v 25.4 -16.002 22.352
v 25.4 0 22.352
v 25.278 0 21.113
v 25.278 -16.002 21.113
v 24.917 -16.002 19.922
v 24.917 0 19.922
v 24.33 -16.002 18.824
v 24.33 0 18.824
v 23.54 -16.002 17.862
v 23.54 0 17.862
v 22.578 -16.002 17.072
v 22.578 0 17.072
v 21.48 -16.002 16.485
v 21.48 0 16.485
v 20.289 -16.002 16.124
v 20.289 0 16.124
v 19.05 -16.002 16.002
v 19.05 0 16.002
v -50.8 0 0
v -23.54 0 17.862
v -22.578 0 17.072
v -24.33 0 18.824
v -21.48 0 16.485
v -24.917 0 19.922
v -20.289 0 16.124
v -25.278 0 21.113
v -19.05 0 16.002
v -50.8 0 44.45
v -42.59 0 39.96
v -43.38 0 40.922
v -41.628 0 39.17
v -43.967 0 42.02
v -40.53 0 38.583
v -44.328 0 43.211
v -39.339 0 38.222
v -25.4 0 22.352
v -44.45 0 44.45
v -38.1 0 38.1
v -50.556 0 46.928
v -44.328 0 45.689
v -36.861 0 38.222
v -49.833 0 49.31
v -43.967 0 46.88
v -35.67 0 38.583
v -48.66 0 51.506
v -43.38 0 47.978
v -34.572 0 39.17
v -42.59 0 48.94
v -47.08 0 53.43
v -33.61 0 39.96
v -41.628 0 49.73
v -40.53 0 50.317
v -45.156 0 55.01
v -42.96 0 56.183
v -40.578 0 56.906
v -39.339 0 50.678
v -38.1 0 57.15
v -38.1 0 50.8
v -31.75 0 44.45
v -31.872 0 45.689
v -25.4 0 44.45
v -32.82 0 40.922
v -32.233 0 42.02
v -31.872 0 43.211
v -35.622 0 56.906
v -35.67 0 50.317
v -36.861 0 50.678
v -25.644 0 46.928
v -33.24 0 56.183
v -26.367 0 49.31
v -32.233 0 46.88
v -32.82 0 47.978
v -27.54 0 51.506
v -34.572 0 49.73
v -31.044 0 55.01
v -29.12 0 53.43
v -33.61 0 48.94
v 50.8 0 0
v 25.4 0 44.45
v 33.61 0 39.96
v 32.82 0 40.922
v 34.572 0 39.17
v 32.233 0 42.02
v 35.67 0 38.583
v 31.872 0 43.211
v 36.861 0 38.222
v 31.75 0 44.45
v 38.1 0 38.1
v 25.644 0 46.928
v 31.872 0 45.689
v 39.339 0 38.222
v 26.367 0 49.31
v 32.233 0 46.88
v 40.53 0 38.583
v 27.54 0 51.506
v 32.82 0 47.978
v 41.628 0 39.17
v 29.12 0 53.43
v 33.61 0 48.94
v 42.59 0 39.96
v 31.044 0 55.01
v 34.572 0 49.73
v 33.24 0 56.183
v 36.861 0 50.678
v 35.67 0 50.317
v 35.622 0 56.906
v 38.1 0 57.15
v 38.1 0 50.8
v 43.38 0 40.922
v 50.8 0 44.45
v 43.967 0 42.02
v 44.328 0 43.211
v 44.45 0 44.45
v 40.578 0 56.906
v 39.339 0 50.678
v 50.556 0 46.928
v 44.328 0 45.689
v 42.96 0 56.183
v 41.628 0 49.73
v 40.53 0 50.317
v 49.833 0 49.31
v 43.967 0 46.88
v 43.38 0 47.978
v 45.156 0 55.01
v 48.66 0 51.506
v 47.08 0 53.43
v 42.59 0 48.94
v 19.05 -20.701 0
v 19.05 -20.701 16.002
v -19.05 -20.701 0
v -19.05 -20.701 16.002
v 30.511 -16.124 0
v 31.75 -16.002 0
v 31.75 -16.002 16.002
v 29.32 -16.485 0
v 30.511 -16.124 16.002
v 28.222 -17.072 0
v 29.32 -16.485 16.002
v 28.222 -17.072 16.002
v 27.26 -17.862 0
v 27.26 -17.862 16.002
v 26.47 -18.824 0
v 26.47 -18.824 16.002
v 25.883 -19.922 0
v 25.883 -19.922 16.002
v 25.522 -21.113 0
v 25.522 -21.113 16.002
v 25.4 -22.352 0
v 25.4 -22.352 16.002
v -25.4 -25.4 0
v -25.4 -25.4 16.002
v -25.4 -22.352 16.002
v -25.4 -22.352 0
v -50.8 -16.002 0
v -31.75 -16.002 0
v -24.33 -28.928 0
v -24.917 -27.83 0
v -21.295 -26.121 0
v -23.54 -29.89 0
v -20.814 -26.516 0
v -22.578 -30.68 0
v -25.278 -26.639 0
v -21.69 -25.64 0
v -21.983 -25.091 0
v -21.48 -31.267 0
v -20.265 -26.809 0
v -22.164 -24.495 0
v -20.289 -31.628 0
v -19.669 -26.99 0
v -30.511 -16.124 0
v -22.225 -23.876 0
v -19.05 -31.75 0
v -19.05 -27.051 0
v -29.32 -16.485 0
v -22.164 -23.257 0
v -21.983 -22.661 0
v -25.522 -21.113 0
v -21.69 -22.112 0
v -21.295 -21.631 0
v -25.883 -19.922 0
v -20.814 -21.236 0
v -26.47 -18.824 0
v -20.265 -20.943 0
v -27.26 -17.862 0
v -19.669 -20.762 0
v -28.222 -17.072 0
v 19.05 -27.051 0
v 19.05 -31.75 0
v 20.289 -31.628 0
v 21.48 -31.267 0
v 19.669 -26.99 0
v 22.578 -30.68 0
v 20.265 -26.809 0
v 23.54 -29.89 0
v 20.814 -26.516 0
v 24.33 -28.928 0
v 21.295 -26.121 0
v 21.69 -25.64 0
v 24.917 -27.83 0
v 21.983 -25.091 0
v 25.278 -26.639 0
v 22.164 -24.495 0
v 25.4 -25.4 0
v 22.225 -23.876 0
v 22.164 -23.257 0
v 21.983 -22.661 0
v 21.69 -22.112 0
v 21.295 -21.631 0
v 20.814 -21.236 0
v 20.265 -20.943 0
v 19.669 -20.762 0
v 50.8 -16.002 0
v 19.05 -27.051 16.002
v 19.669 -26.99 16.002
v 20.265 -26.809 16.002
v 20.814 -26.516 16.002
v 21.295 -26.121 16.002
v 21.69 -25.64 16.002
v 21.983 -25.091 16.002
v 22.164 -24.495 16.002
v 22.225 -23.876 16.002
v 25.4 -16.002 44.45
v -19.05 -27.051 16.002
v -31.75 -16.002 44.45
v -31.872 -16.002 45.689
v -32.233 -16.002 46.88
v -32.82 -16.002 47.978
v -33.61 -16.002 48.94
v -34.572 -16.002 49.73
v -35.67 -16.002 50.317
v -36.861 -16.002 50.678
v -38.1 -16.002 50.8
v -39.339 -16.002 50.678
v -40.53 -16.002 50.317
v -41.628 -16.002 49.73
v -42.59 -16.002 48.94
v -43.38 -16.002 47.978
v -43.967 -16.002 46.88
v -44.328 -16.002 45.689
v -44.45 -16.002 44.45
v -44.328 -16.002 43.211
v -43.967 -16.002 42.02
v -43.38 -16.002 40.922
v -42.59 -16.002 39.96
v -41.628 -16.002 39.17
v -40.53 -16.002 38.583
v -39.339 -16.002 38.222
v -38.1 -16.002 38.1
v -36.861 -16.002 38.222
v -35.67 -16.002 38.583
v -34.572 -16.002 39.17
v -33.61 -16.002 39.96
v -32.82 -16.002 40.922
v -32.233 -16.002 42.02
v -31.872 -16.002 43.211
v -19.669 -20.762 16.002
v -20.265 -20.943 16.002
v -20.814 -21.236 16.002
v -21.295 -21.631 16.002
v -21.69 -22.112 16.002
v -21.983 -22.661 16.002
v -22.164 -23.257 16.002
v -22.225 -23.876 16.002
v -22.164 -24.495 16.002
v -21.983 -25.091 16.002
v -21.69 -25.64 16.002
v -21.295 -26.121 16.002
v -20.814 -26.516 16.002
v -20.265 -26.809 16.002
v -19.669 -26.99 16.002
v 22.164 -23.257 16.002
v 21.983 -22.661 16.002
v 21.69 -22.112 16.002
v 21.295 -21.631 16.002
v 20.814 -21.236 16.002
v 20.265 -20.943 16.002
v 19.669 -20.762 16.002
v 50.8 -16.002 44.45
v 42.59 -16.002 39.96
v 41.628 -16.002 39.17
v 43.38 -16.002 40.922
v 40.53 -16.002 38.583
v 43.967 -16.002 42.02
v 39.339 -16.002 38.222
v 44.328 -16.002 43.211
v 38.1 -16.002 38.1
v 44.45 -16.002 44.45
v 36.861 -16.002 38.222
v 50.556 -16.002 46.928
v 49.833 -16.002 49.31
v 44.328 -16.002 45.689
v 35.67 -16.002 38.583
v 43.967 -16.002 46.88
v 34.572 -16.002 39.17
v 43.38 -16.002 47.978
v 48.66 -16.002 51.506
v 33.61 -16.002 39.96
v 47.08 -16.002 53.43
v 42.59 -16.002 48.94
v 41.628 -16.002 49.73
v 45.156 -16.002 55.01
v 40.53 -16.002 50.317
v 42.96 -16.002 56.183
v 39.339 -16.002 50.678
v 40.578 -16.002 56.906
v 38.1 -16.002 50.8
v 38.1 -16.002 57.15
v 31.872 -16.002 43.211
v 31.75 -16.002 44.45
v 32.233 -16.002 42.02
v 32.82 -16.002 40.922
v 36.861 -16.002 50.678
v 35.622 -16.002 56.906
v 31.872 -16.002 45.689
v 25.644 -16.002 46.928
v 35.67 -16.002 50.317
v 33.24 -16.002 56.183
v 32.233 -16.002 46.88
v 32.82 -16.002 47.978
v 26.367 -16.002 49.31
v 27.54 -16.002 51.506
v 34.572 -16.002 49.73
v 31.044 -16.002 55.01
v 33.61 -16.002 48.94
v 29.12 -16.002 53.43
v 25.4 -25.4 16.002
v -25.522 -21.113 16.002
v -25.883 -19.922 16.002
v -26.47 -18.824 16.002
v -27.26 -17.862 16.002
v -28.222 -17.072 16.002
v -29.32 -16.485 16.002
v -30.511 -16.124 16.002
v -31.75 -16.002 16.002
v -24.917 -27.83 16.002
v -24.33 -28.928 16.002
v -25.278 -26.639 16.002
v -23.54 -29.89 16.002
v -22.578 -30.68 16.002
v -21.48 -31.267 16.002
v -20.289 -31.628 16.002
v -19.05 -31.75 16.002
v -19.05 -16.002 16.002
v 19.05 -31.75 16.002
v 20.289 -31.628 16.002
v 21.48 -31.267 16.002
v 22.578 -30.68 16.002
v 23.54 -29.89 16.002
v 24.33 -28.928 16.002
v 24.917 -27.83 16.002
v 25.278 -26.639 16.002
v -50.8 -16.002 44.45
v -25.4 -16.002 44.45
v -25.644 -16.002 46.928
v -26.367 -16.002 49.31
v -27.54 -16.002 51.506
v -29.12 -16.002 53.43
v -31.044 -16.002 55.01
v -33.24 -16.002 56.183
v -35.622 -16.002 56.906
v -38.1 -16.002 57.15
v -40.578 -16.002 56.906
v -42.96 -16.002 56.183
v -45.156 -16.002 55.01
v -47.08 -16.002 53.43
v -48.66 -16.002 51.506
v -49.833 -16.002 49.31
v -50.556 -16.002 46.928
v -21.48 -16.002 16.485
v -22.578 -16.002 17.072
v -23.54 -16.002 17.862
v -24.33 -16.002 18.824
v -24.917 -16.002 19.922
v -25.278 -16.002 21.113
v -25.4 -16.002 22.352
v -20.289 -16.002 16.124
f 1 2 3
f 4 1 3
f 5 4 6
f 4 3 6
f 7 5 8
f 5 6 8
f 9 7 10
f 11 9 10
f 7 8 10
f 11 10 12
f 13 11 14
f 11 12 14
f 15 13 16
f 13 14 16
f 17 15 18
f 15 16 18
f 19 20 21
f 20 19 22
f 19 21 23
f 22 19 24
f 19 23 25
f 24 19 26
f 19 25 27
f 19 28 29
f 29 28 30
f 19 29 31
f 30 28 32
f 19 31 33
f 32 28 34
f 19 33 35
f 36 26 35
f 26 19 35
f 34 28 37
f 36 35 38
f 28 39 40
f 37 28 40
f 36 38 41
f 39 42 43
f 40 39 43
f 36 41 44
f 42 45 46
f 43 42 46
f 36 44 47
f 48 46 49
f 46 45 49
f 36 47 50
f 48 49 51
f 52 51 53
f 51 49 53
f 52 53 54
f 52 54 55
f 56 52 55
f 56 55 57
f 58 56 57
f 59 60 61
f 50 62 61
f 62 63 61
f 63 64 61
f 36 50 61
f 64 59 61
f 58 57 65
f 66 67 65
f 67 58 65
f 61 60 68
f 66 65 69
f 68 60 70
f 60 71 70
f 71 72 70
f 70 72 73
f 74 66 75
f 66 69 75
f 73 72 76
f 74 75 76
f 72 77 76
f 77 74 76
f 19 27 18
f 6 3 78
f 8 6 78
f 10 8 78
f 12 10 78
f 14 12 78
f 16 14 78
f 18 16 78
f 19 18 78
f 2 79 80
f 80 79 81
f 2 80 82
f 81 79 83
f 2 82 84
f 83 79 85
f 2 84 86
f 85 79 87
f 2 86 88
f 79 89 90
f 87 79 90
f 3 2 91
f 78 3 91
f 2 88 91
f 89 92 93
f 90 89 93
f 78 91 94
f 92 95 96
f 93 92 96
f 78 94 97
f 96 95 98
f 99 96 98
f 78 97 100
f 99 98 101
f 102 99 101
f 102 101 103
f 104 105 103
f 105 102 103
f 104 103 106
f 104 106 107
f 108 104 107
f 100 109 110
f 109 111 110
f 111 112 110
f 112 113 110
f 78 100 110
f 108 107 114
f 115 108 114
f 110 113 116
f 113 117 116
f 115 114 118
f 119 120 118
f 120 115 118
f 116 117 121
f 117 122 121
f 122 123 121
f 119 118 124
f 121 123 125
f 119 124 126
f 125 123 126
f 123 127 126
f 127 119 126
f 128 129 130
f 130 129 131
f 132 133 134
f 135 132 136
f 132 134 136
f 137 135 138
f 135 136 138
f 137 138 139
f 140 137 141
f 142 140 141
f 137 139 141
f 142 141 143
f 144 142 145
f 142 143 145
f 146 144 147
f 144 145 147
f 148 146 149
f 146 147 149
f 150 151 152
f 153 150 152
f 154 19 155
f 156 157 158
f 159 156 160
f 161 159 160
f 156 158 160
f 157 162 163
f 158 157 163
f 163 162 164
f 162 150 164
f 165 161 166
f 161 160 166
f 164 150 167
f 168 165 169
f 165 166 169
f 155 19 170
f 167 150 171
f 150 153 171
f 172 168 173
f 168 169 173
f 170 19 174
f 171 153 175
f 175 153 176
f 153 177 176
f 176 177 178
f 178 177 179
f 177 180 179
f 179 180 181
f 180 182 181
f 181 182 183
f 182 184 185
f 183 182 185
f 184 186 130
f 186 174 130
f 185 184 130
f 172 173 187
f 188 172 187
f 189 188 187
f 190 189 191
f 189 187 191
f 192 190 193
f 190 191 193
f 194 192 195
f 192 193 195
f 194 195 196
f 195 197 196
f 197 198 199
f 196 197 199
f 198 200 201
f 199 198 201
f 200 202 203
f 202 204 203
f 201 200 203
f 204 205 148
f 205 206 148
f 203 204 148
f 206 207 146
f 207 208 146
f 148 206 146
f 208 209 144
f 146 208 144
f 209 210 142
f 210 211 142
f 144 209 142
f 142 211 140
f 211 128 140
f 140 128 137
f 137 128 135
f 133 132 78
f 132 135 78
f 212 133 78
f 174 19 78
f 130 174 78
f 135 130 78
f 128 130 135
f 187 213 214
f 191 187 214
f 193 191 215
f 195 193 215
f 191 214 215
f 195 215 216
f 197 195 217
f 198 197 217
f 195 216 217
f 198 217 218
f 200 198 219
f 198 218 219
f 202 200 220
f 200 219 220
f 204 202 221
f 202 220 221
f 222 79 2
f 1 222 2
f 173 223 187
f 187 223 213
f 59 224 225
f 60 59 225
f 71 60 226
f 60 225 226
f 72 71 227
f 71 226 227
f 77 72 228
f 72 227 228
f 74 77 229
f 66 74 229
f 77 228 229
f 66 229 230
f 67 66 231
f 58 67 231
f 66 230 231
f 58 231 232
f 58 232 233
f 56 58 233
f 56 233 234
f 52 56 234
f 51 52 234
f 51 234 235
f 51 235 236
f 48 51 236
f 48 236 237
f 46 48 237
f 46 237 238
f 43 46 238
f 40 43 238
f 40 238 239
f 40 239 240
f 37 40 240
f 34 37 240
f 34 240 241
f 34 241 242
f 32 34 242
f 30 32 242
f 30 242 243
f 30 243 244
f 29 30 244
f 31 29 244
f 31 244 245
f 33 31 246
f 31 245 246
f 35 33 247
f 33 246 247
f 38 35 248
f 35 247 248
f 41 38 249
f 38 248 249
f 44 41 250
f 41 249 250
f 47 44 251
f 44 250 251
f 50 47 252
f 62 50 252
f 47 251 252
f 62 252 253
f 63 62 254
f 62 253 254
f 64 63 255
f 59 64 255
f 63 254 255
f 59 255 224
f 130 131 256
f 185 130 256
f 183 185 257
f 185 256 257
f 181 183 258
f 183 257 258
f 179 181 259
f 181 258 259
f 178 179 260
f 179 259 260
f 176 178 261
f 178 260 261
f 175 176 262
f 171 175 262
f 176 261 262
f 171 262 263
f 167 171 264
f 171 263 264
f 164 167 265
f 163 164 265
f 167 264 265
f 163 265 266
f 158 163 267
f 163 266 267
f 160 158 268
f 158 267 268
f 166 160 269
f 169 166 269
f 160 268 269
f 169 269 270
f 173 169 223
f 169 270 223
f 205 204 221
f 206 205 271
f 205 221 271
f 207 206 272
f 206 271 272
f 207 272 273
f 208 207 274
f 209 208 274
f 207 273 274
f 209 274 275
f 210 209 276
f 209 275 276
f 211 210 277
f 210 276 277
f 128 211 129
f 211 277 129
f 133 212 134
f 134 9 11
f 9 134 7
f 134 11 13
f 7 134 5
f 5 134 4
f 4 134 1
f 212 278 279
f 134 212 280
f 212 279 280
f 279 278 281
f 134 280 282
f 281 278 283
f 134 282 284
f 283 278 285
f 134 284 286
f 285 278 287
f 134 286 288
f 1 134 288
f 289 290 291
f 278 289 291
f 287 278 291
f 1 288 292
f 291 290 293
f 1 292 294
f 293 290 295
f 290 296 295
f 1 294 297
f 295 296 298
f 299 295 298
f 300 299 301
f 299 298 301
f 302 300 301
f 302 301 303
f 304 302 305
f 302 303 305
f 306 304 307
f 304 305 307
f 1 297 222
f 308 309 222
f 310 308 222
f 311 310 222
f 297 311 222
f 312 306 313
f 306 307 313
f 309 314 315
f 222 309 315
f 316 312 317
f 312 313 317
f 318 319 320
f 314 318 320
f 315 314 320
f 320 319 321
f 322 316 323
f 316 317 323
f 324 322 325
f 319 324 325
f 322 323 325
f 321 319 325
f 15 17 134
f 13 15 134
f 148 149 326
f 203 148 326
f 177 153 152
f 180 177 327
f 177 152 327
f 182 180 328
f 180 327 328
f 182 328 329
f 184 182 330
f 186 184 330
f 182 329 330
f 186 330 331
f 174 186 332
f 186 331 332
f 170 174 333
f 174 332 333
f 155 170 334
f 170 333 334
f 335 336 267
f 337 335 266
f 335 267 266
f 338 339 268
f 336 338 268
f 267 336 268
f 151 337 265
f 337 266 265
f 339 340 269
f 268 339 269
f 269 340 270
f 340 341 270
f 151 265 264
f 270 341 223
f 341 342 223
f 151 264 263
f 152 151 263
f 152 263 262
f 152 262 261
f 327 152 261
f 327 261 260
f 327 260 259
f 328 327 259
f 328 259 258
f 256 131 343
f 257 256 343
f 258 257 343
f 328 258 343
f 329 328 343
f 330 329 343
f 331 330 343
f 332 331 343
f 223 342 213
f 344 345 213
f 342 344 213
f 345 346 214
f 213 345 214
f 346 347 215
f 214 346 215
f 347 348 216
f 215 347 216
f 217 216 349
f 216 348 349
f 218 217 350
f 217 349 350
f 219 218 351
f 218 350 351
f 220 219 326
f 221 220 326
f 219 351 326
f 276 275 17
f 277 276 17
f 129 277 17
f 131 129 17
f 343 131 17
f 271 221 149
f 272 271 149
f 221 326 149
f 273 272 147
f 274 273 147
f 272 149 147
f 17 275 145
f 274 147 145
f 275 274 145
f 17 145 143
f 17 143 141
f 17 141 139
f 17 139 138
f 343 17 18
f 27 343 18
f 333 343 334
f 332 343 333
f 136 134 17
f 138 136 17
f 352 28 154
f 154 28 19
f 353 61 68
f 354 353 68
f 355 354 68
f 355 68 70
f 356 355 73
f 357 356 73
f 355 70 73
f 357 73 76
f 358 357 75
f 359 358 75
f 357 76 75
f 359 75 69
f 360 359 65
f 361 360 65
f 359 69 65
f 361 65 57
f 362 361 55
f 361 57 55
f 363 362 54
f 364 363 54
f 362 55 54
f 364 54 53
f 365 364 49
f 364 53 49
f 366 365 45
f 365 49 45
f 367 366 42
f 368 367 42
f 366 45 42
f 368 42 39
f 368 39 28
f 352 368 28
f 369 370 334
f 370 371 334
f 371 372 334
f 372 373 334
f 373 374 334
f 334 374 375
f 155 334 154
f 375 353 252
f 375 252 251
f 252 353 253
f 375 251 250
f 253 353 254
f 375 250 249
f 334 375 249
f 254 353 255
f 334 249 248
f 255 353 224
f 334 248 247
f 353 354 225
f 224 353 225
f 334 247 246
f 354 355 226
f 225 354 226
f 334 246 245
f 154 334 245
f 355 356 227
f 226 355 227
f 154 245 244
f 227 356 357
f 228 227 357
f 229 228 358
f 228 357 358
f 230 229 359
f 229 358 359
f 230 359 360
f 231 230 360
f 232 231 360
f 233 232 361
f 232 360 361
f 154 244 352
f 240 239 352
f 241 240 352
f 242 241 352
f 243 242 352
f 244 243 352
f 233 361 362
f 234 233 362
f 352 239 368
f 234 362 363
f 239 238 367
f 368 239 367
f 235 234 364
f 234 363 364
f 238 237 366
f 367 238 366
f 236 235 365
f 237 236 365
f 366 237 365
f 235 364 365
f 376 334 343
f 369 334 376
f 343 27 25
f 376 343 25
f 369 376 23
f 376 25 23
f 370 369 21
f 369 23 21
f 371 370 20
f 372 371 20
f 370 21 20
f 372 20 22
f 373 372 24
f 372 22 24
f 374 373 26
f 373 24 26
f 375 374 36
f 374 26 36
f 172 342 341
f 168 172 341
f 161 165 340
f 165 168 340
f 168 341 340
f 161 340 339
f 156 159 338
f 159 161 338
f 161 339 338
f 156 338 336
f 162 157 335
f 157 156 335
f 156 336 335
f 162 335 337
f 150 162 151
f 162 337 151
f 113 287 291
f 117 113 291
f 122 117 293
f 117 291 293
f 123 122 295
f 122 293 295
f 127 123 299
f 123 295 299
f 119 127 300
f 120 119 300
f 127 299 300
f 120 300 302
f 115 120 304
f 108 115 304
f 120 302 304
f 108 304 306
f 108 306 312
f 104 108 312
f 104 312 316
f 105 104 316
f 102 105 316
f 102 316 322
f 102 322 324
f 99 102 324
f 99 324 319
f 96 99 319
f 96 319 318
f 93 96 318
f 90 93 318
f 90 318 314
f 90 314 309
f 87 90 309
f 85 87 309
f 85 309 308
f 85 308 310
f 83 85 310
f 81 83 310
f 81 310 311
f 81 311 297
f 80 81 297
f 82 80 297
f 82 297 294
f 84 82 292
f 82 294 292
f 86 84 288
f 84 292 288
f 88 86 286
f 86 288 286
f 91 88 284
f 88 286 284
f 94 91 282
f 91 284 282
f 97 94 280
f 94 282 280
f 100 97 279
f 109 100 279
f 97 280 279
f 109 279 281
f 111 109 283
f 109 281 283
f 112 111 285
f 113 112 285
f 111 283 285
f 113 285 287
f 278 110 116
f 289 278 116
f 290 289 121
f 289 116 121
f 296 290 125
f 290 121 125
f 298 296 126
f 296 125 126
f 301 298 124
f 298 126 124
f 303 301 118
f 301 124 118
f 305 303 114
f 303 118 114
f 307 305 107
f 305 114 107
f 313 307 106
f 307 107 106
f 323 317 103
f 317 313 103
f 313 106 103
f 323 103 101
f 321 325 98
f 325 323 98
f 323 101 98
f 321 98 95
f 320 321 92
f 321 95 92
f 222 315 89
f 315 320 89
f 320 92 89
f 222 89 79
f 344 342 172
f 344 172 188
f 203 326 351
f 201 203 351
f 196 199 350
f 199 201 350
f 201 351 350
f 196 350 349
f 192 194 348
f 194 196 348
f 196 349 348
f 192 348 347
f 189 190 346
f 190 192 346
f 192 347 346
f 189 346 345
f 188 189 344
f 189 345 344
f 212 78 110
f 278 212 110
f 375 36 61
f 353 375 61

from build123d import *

# Parameters (mm, degrees)
F1_DEPTH = 31.75
F2_W     = 15.748
F2_H     = 28.448
F2_H_2   = 12.7
F3_DEPTH = 101.601
F5_DEPTH = 16.003
F6_R     = 6.35
F7_DEPTH = 16.003
F8_R     = 6.35
F9_DEPTH = 16.003


with BuildPart() as f1:
    # F0 (on Front) → F1 (new body)
    with BuildSketch(Plane.XZ):
        with BuildLine():
            Line((-50.8, 0), (0, 0))
            Line((0, 0), (0, 16.002))
            Line((0, 16.002), (-19.05, 16.002))
            ThreePointArc((-19.05, 16.002), (-23.540128, 17.861872), (-25.4, 22.352))
            Line((-25.4, 22.352), (-25.4, 44.45))
            ThreePointArc((-25.4, 44.45), (-38.1, 57.15), (-50.8, 44.45))
            Line((-50.8, 44.45), (-50.8, 0))
        make_face()
        with BuildLine():
            Line((0, 16.002), (0, 0))
            Line((0, 0), (50.8, 0))
            Line((50.8, 0), (50.8, 44.45))
            ThreePointArc((50.8, 44.45), (38.1, 57.15), (25.4, 44.45))
            Line((25.4, 44.45), (25.4, 22.352))
            ThreePointArc((25.4, 22.352), (23.540128, 17.861872), (19.05, 16.002))
            Line((19.05, 16.002), (0, 16.002))
        make_face()
    extrude(amount=F1_DEPTH)

    # F2 (on face) → F3 (cut, through all)
    with BuildSketch(Plane.YZ.offset(50.8)):
        with Locations((-23.876, 30.226)):
            Rectangle(F2_W, F2_H)
        with Locations((-23.876, 50.8)):
            Rectangle(F2_W, F2_H_2)
    extrude(amount=-F3_DEPTH, mode=Mode.SUBTRACT)

    # F4 (on face) → F5 (cut, through all)
    with BuildSketch(Plane.XY.offset(16.002)):
        with BuildLine():
            Line((-31.75, -16.002), (-50.8, -16.002))
            Line((-50.8, -16.002), (-50.8, -31.75))
            Line((-50.8, -31.75), (-19.05, -31.75))
            ThreePointArc((-19.05, -31.75), (-23.540128, -29.890128), (-25.4, -25.4))
            Line((-25.4, -25.4), (-25.4, -22.352))
            ThreePointArc((-25.4, -22.352), (-27.259872, -17.861872), (-31.75, -16.002))
        make_face()
        with BuildLine():
            ThreePointArc((-19.05, -20.701), (-16.804936, -21.630936), (-15.875, -23.876))
            ThreePointArc((-15.875, -23.876), (-16.804936, -26.121064), (-19.05, -27.051))
            Line((-19.05, -27.051), (19.05, -27.051))
            ThreePointArc((19.05, -27.051), (15.875, -23.876), (19.05, -20.701))
            Line((19.05, -20.701), (-19.05, -20.701))
        make_face()
        with BuildLine():
            ThreePointArc((-19.05, -27.051), (-16.804936, -26.121064), (-15.875, -23.876))
            ThreePointArc((-15.875, -23.876), (-16.804936, -21.630936), (-19.05, -20.701))
            ThreePointArc((-19.05, -20.701), (-22.225, -23.876), (-19.05, -27.051))
        make_face()
        with BuildLine():
            ThreePointArc((22.225, -23.876), (21.295064, -21.630936), (19.05, -20.701))
            Line((19.05, -20.701), (19.05, -27.051))
            ThreePointArc((19.05, -27.051), (21.295064, -26.121064), (22.225, -23.876))
        make_face()
        with BuildLine():
            Line((19.05, -27.051), (19.05, -20.701))
            ThreePointArc((19.05, -20.701), (15.875, -23.876), (19.05, -27.051))
        make_face()
        with BuildLine():
            ThreePointArc((25.4, -25.4), (23.540128, -29.890128), (19.05, -31.75))
            Line((19.05, -31.75), (50.8, -31.75))
            Line((50.8, -31.75), (50.8, -16.002))
            Line((50.8, -16.002), (31.75, -16.002))
            ThreePointArc((31.75, -16.002), (27.259872, -17.861872), (25.4, -22.352))
            Line((25.4, -22.352), (25.4, -25.4))
        make_face()
    extrude(amount=-F5_DEPTH, mode=Mode.SUBTRACT)

    # F6 (on face) → F7 (cut, through all)
    with BuildSketch(Plane.XZ.offset(16.002)):
        with Locations((-38.1, 44.45)):
            Circle(F6_R)
    extrude(amount=-F7_DEPTH, mode=Mode.SUBTRACT)

    # F8 (on face) → F9 (cut, through all)
    with BuildSketch(Plane.XZ.offset(16.002)):
        with Locations((38.1, 44.45)):
            Circle(F8_R)
    extrude(amount=-F9_DEPTH, mode=Mode.SUBTRACT)


solid = f1.part
